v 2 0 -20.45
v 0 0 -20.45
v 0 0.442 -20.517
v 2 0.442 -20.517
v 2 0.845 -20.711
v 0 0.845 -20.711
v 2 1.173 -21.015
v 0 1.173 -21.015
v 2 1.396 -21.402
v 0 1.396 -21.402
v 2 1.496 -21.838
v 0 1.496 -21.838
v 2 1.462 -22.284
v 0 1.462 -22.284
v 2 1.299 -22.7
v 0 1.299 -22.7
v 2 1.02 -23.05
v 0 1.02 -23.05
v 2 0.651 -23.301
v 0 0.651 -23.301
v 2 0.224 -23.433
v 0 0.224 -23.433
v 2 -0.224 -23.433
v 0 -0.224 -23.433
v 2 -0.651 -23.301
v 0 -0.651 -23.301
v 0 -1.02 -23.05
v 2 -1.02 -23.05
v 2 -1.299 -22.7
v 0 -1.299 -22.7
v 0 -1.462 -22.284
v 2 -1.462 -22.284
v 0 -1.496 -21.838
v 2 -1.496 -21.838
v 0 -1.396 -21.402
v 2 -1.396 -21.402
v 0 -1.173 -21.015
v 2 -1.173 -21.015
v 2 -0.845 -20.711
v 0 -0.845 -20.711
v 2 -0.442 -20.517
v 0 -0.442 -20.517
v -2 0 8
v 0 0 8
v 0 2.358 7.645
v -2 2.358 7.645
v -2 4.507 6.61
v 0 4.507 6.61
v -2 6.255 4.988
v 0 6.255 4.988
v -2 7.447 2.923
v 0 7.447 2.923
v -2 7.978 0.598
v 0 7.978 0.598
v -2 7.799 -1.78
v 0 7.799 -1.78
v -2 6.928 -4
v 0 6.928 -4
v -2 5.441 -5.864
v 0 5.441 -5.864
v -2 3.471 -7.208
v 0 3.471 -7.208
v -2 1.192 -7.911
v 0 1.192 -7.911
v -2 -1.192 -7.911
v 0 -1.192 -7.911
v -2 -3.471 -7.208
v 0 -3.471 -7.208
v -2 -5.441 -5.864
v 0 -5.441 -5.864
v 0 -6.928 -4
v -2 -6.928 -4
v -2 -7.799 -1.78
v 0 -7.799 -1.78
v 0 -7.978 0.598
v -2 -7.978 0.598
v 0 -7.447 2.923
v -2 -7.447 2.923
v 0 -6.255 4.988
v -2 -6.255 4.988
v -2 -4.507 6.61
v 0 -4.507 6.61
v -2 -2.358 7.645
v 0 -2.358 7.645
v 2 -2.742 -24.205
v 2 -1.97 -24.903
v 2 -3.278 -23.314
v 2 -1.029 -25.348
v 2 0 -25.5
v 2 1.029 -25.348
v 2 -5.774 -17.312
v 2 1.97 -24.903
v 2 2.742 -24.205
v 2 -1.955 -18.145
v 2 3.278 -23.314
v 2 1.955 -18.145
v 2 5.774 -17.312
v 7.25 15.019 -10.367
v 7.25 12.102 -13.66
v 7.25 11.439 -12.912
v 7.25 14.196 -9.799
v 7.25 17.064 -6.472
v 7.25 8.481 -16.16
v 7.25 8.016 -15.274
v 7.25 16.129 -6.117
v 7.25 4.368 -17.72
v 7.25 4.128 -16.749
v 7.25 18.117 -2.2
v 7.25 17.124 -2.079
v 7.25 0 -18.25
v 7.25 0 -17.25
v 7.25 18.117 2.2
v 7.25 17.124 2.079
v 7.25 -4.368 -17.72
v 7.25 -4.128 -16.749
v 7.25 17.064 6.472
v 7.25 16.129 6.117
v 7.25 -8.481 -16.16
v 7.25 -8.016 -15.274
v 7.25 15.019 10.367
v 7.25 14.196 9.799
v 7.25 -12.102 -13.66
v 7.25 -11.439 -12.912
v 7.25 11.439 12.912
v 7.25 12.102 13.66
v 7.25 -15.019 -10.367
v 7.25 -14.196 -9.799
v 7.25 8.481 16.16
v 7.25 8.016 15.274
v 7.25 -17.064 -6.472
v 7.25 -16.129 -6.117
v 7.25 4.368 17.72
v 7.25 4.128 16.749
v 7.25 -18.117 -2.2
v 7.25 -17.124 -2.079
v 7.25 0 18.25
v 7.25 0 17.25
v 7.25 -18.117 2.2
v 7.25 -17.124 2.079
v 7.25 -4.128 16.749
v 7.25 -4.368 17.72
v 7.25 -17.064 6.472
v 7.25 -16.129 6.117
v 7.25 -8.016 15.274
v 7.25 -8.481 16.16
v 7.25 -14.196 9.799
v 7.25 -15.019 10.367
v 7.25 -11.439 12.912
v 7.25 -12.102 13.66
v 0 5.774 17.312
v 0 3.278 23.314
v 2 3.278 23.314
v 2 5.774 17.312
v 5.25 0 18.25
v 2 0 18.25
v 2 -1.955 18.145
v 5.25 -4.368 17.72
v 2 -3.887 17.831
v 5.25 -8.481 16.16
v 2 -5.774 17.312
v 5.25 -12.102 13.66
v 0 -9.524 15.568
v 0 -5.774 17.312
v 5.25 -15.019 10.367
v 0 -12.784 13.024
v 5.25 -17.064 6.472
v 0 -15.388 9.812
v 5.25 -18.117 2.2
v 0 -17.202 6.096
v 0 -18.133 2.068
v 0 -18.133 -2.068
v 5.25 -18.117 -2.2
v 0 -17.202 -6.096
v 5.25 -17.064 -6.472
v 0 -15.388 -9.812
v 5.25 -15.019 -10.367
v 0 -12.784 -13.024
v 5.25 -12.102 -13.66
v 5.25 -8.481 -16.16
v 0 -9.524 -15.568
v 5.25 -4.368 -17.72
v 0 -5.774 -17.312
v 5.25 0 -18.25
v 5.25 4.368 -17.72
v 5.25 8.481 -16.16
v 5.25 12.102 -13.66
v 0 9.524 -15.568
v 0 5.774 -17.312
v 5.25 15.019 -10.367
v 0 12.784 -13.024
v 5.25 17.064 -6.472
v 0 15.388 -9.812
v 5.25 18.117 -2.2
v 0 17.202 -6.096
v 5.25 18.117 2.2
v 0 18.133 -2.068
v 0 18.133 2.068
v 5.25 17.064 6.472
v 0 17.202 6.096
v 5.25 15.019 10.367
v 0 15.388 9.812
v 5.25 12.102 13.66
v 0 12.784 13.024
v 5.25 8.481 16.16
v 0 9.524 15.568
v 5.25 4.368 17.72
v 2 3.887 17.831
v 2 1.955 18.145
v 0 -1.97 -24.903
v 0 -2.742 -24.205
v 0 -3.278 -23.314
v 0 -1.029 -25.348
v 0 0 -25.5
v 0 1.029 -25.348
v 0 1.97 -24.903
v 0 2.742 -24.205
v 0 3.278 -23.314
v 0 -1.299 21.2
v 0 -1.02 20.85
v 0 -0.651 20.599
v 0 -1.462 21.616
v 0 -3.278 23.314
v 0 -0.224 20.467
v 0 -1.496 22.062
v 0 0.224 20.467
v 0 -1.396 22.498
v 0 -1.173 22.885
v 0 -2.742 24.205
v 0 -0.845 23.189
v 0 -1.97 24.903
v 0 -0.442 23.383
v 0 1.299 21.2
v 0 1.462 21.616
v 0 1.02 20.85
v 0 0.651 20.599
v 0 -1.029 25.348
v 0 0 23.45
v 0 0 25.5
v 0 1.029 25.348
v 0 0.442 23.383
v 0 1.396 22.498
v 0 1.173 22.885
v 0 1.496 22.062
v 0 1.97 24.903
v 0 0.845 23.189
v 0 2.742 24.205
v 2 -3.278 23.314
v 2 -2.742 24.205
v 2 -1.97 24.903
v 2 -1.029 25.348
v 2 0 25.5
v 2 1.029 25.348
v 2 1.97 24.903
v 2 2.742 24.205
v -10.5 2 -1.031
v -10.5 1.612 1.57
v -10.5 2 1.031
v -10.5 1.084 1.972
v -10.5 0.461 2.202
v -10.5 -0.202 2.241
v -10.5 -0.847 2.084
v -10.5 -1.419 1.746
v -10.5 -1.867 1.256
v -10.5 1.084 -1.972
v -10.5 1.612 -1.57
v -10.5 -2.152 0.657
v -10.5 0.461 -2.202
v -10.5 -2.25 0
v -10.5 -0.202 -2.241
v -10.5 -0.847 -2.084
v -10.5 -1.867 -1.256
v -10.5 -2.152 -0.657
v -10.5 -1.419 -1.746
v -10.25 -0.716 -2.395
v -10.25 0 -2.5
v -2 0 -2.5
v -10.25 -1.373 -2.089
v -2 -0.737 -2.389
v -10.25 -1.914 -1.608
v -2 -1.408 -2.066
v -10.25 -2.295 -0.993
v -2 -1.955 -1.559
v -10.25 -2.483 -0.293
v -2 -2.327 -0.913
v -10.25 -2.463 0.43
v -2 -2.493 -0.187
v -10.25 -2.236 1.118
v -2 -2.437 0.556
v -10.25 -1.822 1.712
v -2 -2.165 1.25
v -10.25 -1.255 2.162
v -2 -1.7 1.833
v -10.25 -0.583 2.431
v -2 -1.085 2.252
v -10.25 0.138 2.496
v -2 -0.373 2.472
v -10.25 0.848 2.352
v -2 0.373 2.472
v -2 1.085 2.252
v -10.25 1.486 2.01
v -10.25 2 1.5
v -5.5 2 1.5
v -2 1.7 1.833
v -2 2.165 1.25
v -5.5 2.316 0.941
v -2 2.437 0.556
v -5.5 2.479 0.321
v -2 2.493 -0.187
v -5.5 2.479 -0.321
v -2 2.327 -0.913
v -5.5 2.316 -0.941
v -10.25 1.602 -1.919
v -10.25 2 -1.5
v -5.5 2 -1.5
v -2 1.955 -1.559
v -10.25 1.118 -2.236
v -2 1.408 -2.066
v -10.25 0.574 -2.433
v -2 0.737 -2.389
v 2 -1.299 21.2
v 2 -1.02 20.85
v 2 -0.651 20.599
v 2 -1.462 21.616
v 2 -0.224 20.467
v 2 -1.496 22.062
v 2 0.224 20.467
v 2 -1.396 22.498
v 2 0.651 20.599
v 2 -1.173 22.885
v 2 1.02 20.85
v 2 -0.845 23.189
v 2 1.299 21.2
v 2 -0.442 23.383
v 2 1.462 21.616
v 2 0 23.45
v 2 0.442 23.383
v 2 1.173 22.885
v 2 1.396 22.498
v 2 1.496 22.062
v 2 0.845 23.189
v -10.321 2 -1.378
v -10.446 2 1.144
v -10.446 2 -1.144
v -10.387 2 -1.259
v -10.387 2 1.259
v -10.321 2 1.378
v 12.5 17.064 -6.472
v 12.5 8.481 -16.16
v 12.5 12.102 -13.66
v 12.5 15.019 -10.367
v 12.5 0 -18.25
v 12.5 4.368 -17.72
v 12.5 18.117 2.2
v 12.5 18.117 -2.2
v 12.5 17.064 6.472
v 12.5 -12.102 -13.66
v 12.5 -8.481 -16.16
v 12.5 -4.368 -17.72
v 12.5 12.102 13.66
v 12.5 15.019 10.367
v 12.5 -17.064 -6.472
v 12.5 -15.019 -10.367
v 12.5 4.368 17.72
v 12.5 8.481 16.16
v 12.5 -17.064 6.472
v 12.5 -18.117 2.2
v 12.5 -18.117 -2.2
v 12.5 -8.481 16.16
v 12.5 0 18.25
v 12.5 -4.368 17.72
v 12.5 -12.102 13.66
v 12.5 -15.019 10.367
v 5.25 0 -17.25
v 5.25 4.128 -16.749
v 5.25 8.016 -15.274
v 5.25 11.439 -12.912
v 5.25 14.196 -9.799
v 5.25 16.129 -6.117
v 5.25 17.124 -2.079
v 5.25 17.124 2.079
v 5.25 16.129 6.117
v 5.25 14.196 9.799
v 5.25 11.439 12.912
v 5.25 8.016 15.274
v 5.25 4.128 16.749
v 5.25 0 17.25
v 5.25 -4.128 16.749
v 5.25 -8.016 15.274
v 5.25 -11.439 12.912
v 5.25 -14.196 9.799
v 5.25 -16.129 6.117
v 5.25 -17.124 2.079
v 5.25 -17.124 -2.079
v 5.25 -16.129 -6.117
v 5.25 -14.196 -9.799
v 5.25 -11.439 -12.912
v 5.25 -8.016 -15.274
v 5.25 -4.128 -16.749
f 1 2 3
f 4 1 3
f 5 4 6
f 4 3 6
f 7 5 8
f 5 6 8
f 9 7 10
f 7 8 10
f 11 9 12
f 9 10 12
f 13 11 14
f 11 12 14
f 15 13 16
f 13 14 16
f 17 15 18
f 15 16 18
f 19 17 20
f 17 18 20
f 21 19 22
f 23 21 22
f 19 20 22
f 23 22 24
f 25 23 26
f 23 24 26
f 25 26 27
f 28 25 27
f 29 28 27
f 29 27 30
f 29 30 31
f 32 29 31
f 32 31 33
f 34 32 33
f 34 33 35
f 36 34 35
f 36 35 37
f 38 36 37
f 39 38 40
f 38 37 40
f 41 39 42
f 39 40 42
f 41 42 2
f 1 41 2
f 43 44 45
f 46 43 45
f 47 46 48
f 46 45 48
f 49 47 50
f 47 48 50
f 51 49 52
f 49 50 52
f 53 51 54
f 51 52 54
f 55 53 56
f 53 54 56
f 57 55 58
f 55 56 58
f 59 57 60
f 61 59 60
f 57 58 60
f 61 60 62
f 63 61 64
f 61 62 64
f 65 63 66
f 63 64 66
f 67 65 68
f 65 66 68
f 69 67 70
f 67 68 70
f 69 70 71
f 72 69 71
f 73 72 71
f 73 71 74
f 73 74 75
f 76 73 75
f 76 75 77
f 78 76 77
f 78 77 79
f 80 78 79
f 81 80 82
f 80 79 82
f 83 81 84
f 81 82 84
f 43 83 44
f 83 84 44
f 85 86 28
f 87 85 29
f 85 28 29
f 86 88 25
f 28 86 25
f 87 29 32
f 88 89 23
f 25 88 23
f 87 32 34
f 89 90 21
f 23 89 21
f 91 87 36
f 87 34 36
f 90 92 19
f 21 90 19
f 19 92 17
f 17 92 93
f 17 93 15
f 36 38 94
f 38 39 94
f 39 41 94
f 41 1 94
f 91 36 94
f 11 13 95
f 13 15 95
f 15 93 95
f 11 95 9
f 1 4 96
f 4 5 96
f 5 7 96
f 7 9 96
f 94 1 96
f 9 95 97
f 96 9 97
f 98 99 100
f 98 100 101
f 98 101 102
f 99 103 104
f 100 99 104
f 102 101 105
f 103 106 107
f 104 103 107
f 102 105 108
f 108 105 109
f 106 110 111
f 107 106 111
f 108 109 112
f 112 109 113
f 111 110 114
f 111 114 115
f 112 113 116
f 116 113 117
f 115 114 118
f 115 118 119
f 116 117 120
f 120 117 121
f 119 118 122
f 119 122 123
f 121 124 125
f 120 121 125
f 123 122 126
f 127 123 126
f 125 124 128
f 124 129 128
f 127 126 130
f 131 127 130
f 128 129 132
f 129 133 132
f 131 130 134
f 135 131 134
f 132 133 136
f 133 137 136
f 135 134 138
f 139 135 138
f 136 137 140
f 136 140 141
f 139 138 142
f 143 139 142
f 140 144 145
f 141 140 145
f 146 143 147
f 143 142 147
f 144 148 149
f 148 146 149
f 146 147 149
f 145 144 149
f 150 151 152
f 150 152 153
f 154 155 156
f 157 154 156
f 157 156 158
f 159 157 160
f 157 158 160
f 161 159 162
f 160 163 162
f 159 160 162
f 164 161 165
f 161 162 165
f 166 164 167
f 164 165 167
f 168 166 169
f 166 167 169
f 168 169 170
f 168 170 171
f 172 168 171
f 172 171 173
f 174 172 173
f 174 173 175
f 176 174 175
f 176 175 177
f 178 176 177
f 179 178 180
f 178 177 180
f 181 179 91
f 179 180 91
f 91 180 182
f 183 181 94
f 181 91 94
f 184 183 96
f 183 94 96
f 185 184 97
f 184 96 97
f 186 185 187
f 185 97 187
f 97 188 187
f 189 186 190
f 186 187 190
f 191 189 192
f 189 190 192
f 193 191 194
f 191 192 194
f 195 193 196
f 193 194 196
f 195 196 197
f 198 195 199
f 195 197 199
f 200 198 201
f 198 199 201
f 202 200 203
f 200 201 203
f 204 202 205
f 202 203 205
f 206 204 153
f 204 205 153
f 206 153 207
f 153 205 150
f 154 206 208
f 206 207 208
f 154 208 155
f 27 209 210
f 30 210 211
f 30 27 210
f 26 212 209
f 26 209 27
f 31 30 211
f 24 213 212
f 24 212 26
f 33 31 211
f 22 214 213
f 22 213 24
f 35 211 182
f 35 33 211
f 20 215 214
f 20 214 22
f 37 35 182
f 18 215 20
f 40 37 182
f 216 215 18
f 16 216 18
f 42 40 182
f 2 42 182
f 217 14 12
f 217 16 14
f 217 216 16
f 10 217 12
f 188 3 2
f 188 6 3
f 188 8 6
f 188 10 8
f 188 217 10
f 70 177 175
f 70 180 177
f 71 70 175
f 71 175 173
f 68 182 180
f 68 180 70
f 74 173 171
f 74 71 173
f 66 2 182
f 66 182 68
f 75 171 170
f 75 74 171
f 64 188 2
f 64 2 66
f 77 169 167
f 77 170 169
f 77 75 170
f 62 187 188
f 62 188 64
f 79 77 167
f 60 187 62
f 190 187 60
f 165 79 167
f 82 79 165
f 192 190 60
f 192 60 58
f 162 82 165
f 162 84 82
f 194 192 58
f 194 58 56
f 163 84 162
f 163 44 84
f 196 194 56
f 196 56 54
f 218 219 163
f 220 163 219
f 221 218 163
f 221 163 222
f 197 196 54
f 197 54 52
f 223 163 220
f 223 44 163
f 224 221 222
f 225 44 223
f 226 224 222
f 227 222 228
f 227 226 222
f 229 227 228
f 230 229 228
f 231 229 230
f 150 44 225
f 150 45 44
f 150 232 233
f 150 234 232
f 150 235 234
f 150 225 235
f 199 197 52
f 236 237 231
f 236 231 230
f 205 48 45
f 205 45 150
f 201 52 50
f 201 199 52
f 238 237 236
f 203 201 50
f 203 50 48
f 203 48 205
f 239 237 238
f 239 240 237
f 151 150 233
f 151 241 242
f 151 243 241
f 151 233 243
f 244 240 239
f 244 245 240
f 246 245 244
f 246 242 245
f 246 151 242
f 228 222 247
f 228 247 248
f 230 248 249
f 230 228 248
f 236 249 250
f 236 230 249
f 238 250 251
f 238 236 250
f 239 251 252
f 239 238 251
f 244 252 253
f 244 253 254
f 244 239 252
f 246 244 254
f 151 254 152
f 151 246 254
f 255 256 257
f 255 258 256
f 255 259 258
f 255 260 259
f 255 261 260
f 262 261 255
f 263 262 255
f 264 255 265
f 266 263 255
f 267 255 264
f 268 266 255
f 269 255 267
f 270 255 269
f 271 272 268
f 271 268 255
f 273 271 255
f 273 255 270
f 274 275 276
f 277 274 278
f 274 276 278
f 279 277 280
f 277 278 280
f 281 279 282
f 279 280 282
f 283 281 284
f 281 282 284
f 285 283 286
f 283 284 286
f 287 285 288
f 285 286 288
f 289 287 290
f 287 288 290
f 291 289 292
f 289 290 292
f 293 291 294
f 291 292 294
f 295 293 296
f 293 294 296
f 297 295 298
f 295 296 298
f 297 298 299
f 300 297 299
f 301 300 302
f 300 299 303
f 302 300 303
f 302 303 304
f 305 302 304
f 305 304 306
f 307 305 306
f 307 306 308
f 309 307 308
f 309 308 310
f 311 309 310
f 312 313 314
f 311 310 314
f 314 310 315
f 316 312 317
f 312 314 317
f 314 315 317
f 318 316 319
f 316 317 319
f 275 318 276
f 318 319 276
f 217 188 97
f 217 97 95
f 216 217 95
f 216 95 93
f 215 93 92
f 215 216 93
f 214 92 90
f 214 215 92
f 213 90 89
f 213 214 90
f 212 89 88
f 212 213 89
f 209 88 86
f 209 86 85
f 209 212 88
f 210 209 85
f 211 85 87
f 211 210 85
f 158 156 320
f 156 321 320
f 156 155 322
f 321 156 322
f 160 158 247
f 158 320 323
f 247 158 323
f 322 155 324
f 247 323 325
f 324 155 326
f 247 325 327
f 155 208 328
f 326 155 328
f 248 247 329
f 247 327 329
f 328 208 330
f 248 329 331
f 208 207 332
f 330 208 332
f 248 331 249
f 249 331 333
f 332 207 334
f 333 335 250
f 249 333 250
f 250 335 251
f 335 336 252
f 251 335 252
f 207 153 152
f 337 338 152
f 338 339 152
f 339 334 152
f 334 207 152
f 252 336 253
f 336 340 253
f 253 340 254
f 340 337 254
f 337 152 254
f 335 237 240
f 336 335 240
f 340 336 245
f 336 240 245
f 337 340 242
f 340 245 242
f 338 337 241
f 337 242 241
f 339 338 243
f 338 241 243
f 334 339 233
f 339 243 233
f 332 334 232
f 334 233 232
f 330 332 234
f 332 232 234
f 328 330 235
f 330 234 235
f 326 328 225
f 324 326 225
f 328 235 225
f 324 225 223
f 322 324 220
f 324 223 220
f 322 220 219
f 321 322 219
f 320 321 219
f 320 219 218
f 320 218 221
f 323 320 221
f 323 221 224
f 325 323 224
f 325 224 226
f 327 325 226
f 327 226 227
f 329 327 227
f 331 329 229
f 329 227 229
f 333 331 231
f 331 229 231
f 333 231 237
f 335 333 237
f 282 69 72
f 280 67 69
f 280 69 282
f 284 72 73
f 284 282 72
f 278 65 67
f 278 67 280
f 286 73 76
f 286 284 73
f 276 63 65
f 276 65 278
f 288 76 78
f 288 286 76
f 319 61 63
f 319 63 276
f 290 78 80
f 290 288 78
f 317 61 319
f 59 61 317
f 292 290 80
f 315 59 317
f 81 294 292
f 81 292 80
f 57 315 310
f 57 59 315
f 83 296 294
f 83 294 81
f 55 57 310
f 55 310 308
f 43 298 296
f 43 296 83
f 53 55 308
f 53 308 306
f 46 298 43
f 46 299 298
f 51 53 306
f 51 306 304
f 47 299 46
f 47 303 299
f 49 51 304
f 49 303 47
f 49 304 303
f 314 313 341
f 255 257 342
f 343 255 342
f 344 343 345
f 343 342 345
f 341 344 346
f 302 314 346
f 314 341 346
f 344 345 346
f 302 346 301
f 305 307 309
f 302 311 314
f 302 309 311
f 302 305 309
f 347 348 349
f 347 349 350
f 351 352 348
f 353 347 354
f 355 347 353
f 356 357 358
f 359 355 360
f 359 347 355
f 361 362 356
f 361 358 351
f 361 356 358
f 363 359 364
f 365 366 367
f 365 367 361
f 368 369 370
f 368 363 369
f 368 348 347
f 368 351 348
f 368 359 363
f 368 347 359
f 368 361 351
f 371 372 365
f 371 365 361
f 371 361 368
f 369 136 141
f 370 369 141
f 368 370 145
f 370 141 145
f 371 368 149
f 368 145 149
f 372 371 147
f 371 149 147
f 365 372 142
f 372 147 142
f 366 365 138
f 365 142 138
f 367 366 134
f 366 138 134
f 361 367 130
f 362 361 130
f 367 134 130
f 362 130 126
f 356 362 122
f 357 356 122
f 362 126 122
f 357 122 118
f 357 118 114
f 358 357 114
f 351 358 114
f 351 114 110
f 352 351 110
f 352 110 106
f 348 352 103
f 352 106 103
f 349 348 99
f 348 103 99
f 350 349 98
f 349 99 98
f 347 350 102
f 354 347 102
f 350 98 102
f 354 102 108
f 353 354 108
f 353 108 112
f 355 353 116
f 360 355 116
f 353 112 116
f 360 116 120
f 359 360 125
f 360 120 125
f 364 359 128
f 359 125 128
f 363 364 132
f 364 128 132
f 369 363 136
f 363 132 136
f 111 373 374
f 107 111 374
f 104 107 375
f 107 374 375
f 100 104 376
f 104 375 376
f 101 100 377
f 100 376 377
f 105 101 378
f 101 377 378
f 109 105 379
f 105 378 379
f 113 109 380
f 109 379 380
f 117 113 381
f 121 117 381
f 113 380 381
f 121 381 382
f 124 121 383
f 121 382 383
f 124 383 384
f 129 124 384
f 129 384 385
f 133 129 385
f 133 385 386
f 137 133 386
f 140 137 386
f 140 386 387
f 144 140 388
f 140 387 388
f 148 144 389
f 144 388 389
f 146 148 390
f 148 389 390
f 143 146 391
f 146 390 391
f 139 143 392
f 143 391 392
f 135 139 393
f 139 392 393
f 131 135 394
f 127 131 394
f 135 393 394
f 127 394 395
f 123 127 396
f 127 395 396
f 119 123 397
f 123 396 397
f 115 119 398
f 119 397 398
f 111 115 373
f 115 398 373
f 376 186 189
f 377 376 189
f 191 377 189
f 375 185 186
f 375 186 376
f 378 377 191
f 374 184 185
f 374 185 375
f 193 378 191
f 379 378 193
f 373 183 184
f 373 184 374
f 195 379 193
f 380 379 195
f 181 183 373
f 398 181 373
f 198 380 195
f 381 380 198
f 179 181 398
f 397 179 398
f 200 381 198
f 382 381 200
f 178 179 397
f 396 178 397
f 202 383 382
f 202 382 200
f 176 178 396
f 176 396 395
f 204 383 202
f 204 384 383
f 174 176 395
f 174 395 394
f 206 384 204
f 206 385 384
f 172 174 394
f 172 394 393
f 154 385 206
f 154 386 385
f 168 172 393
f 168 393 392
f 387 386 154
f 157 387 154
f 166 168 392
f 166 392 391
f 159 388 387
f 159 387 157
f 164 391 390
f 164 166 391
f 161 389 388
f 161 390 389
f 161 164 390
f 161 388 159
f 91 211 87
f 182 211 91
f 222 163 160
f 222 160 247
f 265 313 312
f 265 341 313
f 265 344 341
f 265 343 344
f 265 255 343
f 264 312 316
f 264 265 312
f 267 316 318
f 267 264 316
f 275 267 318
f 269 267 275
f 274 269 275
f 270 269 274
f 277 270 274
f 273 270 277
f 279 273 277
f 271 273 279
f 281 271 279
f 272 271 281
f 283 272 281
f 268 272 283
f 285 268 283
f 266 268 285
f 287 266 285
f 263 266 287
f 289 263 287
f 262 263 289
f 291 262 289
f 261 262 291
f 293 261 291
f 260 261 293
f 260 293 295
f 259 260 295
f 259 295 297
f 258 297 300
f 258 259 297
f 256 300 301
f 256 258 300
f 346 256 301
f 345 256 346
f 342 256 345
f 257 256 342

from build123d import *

# Parameters (mm, degrees)
ESQUISSE2_R             = 18.25
BOSS_EXTRU_1_DEPTH      = 5.25
ESQUISSE3_R             = 17.25
BOSS_EXTRU_2_DEPTH      = 2
ESQUISSE4_R             = 18.25
BOSS_EXTRU_3_DEPTH      = 5.25
ESQUISSE6_R             = 1.5
BOSS_EXTRU_4_DEPTH      = 2
ESQUISSE7_R             = 8
BOSS_EXTRU_5_DEPTH      = 2
ESQUISSE8_R             = 2.5
BOSS_EXTRU_6_DEPTH      = 10.5
CHANFREIN1_SIZE         = 0.25
ESQUISSE9_W             = 5
ESQUISSE9_H             = 1
ENL_V_MAT_EXTRU_1_DEPTH = 5


with BuildPart() as part:
    # Esquisse2 → Boss.-Extru.1 (new body)
    with BuildSketch(Plane(origin=(0, 0, 0), x_dir=(0, 0, -1), z_dir=(1, 0, 0))):
        with Locations(Location((0, 0, 0), (0, 0, 180))):
            Circle(ESQUISSE2_R)
    extrude(amount=BOSS_EXTRU_1_DEPTH)

    # Esquisse3 → Boss.-Extru.2 (add)
    with BuildSketch(Plane(origin=(5.25, 0, 0), x_dir=(0, 0, -1), z_dir=(1, 0, 0))):
        Circle(ESQUISSE3_R)
    extrude(amount=BOSS_EXTRU_2_DEPTH)

    # Esquisse4 → Boss.-Extru.3 (add)
    with BuildSketch(Plane(origin=(7.25, 0, 0), x_dir=(0, 0, -1), z_dir=(1, 0, 0))):
        with Locations(Location((0, 0, 0), (0, 0, 180))):
            Circle(ESQUISSE4_R)
    extrude(amount=BOSS_EXTRU_3_DEPTH)

    # Esquisse6 → Boss.-Extru.4 (add)
    # profile 1 of 2: a face of its own
    with BuildSketch(Plane.ZY):
        with BuildLine():
            ThreePointArc((23.313667029, -3.27763821), (25.5, 0), (23.313667029, 3.27763821))
            Line((23.313667029, 3.27763821), (17.312357631, 5.774493333))
            ThreePointArc((17.312357631, 5.774493333), (18.014064322, 2.925061814), (18.25, 0))
            ThreePointArc((18.25, 0), (18.014064322, -2.925061814), (17.312357631, -5.774493333))
            Line((17.312357631, -5.774493333), (23.313667029, -3.27763821))
        make_face()
        with Locations((21.95, 0)):
            Circle(ESQUISSE6_R, mode=Mode.SUBTRACT)
    # profile 2 of 2: a face of its own
    with BuildSketch(Plane.ZY):
        with BuildLine():
            ThreePointArc((-17.312357631, -5.774493333), (-18.25, 0), (-17.312357631, 5.774493333))
            Line((-17.312357631, 5.774493333), (-23.313667029, 3.27763821))
            ThreePointArc((-23.313667029, 3.27763821), (-25.5, 0), (-23.313667029, -3.27763821))
            Line((-23.313667029, -3.27763821), (-17.312357631, -5.774493333))
        make_face()
        with Locations((-21.95, 0)):
            Circle(ESQUISSE6_R, mode=Mode.SUBTRACT)
    extrude(amount=-BOSS_EXTRU_4_DEPTH)

    # Esquisse7 → Boss.-Extru.5 (add)
    with BuildSketch(Plane.ZY):
        Circle(ESQUISSE7_R)
    extrude(amount=BOSS_EXTRU_5_DEPTH)

    # Esquisse8 → Boss.-Extru.6 (add)
    with BuildSketch(Plane.ZY):
        with Locations(Location((0, 0, 0), (0, 0, 180))):
            Circle(ESQUISSE8_R)
    extrude(amount=BOSS_EXTRU_6_DEPTH)

    # Chanfrein1
    chanfrein1_edges = [part.edges().sort_by_distance(p)[0] for p in [
        (-10.5, 0, 2.5),
    ]]
    chamfer(chanfrein1_edges, length=CHANFREIN1_SIZE)

    # Esquisse9 → Enlèv. mat.-Extru.1 (cut)
    with BuildSketch(Plane.ZY.offset(10.5)):
        with Locations((0, 2.5)):
            Rectangle(ESQUISSE9_W, ESQUISSE9_H)
    extrude(amount=-ENL_V_MAT_EXTRU_1_DEPTH, mode=Mode.SUBTRACT)


solid = part.part
